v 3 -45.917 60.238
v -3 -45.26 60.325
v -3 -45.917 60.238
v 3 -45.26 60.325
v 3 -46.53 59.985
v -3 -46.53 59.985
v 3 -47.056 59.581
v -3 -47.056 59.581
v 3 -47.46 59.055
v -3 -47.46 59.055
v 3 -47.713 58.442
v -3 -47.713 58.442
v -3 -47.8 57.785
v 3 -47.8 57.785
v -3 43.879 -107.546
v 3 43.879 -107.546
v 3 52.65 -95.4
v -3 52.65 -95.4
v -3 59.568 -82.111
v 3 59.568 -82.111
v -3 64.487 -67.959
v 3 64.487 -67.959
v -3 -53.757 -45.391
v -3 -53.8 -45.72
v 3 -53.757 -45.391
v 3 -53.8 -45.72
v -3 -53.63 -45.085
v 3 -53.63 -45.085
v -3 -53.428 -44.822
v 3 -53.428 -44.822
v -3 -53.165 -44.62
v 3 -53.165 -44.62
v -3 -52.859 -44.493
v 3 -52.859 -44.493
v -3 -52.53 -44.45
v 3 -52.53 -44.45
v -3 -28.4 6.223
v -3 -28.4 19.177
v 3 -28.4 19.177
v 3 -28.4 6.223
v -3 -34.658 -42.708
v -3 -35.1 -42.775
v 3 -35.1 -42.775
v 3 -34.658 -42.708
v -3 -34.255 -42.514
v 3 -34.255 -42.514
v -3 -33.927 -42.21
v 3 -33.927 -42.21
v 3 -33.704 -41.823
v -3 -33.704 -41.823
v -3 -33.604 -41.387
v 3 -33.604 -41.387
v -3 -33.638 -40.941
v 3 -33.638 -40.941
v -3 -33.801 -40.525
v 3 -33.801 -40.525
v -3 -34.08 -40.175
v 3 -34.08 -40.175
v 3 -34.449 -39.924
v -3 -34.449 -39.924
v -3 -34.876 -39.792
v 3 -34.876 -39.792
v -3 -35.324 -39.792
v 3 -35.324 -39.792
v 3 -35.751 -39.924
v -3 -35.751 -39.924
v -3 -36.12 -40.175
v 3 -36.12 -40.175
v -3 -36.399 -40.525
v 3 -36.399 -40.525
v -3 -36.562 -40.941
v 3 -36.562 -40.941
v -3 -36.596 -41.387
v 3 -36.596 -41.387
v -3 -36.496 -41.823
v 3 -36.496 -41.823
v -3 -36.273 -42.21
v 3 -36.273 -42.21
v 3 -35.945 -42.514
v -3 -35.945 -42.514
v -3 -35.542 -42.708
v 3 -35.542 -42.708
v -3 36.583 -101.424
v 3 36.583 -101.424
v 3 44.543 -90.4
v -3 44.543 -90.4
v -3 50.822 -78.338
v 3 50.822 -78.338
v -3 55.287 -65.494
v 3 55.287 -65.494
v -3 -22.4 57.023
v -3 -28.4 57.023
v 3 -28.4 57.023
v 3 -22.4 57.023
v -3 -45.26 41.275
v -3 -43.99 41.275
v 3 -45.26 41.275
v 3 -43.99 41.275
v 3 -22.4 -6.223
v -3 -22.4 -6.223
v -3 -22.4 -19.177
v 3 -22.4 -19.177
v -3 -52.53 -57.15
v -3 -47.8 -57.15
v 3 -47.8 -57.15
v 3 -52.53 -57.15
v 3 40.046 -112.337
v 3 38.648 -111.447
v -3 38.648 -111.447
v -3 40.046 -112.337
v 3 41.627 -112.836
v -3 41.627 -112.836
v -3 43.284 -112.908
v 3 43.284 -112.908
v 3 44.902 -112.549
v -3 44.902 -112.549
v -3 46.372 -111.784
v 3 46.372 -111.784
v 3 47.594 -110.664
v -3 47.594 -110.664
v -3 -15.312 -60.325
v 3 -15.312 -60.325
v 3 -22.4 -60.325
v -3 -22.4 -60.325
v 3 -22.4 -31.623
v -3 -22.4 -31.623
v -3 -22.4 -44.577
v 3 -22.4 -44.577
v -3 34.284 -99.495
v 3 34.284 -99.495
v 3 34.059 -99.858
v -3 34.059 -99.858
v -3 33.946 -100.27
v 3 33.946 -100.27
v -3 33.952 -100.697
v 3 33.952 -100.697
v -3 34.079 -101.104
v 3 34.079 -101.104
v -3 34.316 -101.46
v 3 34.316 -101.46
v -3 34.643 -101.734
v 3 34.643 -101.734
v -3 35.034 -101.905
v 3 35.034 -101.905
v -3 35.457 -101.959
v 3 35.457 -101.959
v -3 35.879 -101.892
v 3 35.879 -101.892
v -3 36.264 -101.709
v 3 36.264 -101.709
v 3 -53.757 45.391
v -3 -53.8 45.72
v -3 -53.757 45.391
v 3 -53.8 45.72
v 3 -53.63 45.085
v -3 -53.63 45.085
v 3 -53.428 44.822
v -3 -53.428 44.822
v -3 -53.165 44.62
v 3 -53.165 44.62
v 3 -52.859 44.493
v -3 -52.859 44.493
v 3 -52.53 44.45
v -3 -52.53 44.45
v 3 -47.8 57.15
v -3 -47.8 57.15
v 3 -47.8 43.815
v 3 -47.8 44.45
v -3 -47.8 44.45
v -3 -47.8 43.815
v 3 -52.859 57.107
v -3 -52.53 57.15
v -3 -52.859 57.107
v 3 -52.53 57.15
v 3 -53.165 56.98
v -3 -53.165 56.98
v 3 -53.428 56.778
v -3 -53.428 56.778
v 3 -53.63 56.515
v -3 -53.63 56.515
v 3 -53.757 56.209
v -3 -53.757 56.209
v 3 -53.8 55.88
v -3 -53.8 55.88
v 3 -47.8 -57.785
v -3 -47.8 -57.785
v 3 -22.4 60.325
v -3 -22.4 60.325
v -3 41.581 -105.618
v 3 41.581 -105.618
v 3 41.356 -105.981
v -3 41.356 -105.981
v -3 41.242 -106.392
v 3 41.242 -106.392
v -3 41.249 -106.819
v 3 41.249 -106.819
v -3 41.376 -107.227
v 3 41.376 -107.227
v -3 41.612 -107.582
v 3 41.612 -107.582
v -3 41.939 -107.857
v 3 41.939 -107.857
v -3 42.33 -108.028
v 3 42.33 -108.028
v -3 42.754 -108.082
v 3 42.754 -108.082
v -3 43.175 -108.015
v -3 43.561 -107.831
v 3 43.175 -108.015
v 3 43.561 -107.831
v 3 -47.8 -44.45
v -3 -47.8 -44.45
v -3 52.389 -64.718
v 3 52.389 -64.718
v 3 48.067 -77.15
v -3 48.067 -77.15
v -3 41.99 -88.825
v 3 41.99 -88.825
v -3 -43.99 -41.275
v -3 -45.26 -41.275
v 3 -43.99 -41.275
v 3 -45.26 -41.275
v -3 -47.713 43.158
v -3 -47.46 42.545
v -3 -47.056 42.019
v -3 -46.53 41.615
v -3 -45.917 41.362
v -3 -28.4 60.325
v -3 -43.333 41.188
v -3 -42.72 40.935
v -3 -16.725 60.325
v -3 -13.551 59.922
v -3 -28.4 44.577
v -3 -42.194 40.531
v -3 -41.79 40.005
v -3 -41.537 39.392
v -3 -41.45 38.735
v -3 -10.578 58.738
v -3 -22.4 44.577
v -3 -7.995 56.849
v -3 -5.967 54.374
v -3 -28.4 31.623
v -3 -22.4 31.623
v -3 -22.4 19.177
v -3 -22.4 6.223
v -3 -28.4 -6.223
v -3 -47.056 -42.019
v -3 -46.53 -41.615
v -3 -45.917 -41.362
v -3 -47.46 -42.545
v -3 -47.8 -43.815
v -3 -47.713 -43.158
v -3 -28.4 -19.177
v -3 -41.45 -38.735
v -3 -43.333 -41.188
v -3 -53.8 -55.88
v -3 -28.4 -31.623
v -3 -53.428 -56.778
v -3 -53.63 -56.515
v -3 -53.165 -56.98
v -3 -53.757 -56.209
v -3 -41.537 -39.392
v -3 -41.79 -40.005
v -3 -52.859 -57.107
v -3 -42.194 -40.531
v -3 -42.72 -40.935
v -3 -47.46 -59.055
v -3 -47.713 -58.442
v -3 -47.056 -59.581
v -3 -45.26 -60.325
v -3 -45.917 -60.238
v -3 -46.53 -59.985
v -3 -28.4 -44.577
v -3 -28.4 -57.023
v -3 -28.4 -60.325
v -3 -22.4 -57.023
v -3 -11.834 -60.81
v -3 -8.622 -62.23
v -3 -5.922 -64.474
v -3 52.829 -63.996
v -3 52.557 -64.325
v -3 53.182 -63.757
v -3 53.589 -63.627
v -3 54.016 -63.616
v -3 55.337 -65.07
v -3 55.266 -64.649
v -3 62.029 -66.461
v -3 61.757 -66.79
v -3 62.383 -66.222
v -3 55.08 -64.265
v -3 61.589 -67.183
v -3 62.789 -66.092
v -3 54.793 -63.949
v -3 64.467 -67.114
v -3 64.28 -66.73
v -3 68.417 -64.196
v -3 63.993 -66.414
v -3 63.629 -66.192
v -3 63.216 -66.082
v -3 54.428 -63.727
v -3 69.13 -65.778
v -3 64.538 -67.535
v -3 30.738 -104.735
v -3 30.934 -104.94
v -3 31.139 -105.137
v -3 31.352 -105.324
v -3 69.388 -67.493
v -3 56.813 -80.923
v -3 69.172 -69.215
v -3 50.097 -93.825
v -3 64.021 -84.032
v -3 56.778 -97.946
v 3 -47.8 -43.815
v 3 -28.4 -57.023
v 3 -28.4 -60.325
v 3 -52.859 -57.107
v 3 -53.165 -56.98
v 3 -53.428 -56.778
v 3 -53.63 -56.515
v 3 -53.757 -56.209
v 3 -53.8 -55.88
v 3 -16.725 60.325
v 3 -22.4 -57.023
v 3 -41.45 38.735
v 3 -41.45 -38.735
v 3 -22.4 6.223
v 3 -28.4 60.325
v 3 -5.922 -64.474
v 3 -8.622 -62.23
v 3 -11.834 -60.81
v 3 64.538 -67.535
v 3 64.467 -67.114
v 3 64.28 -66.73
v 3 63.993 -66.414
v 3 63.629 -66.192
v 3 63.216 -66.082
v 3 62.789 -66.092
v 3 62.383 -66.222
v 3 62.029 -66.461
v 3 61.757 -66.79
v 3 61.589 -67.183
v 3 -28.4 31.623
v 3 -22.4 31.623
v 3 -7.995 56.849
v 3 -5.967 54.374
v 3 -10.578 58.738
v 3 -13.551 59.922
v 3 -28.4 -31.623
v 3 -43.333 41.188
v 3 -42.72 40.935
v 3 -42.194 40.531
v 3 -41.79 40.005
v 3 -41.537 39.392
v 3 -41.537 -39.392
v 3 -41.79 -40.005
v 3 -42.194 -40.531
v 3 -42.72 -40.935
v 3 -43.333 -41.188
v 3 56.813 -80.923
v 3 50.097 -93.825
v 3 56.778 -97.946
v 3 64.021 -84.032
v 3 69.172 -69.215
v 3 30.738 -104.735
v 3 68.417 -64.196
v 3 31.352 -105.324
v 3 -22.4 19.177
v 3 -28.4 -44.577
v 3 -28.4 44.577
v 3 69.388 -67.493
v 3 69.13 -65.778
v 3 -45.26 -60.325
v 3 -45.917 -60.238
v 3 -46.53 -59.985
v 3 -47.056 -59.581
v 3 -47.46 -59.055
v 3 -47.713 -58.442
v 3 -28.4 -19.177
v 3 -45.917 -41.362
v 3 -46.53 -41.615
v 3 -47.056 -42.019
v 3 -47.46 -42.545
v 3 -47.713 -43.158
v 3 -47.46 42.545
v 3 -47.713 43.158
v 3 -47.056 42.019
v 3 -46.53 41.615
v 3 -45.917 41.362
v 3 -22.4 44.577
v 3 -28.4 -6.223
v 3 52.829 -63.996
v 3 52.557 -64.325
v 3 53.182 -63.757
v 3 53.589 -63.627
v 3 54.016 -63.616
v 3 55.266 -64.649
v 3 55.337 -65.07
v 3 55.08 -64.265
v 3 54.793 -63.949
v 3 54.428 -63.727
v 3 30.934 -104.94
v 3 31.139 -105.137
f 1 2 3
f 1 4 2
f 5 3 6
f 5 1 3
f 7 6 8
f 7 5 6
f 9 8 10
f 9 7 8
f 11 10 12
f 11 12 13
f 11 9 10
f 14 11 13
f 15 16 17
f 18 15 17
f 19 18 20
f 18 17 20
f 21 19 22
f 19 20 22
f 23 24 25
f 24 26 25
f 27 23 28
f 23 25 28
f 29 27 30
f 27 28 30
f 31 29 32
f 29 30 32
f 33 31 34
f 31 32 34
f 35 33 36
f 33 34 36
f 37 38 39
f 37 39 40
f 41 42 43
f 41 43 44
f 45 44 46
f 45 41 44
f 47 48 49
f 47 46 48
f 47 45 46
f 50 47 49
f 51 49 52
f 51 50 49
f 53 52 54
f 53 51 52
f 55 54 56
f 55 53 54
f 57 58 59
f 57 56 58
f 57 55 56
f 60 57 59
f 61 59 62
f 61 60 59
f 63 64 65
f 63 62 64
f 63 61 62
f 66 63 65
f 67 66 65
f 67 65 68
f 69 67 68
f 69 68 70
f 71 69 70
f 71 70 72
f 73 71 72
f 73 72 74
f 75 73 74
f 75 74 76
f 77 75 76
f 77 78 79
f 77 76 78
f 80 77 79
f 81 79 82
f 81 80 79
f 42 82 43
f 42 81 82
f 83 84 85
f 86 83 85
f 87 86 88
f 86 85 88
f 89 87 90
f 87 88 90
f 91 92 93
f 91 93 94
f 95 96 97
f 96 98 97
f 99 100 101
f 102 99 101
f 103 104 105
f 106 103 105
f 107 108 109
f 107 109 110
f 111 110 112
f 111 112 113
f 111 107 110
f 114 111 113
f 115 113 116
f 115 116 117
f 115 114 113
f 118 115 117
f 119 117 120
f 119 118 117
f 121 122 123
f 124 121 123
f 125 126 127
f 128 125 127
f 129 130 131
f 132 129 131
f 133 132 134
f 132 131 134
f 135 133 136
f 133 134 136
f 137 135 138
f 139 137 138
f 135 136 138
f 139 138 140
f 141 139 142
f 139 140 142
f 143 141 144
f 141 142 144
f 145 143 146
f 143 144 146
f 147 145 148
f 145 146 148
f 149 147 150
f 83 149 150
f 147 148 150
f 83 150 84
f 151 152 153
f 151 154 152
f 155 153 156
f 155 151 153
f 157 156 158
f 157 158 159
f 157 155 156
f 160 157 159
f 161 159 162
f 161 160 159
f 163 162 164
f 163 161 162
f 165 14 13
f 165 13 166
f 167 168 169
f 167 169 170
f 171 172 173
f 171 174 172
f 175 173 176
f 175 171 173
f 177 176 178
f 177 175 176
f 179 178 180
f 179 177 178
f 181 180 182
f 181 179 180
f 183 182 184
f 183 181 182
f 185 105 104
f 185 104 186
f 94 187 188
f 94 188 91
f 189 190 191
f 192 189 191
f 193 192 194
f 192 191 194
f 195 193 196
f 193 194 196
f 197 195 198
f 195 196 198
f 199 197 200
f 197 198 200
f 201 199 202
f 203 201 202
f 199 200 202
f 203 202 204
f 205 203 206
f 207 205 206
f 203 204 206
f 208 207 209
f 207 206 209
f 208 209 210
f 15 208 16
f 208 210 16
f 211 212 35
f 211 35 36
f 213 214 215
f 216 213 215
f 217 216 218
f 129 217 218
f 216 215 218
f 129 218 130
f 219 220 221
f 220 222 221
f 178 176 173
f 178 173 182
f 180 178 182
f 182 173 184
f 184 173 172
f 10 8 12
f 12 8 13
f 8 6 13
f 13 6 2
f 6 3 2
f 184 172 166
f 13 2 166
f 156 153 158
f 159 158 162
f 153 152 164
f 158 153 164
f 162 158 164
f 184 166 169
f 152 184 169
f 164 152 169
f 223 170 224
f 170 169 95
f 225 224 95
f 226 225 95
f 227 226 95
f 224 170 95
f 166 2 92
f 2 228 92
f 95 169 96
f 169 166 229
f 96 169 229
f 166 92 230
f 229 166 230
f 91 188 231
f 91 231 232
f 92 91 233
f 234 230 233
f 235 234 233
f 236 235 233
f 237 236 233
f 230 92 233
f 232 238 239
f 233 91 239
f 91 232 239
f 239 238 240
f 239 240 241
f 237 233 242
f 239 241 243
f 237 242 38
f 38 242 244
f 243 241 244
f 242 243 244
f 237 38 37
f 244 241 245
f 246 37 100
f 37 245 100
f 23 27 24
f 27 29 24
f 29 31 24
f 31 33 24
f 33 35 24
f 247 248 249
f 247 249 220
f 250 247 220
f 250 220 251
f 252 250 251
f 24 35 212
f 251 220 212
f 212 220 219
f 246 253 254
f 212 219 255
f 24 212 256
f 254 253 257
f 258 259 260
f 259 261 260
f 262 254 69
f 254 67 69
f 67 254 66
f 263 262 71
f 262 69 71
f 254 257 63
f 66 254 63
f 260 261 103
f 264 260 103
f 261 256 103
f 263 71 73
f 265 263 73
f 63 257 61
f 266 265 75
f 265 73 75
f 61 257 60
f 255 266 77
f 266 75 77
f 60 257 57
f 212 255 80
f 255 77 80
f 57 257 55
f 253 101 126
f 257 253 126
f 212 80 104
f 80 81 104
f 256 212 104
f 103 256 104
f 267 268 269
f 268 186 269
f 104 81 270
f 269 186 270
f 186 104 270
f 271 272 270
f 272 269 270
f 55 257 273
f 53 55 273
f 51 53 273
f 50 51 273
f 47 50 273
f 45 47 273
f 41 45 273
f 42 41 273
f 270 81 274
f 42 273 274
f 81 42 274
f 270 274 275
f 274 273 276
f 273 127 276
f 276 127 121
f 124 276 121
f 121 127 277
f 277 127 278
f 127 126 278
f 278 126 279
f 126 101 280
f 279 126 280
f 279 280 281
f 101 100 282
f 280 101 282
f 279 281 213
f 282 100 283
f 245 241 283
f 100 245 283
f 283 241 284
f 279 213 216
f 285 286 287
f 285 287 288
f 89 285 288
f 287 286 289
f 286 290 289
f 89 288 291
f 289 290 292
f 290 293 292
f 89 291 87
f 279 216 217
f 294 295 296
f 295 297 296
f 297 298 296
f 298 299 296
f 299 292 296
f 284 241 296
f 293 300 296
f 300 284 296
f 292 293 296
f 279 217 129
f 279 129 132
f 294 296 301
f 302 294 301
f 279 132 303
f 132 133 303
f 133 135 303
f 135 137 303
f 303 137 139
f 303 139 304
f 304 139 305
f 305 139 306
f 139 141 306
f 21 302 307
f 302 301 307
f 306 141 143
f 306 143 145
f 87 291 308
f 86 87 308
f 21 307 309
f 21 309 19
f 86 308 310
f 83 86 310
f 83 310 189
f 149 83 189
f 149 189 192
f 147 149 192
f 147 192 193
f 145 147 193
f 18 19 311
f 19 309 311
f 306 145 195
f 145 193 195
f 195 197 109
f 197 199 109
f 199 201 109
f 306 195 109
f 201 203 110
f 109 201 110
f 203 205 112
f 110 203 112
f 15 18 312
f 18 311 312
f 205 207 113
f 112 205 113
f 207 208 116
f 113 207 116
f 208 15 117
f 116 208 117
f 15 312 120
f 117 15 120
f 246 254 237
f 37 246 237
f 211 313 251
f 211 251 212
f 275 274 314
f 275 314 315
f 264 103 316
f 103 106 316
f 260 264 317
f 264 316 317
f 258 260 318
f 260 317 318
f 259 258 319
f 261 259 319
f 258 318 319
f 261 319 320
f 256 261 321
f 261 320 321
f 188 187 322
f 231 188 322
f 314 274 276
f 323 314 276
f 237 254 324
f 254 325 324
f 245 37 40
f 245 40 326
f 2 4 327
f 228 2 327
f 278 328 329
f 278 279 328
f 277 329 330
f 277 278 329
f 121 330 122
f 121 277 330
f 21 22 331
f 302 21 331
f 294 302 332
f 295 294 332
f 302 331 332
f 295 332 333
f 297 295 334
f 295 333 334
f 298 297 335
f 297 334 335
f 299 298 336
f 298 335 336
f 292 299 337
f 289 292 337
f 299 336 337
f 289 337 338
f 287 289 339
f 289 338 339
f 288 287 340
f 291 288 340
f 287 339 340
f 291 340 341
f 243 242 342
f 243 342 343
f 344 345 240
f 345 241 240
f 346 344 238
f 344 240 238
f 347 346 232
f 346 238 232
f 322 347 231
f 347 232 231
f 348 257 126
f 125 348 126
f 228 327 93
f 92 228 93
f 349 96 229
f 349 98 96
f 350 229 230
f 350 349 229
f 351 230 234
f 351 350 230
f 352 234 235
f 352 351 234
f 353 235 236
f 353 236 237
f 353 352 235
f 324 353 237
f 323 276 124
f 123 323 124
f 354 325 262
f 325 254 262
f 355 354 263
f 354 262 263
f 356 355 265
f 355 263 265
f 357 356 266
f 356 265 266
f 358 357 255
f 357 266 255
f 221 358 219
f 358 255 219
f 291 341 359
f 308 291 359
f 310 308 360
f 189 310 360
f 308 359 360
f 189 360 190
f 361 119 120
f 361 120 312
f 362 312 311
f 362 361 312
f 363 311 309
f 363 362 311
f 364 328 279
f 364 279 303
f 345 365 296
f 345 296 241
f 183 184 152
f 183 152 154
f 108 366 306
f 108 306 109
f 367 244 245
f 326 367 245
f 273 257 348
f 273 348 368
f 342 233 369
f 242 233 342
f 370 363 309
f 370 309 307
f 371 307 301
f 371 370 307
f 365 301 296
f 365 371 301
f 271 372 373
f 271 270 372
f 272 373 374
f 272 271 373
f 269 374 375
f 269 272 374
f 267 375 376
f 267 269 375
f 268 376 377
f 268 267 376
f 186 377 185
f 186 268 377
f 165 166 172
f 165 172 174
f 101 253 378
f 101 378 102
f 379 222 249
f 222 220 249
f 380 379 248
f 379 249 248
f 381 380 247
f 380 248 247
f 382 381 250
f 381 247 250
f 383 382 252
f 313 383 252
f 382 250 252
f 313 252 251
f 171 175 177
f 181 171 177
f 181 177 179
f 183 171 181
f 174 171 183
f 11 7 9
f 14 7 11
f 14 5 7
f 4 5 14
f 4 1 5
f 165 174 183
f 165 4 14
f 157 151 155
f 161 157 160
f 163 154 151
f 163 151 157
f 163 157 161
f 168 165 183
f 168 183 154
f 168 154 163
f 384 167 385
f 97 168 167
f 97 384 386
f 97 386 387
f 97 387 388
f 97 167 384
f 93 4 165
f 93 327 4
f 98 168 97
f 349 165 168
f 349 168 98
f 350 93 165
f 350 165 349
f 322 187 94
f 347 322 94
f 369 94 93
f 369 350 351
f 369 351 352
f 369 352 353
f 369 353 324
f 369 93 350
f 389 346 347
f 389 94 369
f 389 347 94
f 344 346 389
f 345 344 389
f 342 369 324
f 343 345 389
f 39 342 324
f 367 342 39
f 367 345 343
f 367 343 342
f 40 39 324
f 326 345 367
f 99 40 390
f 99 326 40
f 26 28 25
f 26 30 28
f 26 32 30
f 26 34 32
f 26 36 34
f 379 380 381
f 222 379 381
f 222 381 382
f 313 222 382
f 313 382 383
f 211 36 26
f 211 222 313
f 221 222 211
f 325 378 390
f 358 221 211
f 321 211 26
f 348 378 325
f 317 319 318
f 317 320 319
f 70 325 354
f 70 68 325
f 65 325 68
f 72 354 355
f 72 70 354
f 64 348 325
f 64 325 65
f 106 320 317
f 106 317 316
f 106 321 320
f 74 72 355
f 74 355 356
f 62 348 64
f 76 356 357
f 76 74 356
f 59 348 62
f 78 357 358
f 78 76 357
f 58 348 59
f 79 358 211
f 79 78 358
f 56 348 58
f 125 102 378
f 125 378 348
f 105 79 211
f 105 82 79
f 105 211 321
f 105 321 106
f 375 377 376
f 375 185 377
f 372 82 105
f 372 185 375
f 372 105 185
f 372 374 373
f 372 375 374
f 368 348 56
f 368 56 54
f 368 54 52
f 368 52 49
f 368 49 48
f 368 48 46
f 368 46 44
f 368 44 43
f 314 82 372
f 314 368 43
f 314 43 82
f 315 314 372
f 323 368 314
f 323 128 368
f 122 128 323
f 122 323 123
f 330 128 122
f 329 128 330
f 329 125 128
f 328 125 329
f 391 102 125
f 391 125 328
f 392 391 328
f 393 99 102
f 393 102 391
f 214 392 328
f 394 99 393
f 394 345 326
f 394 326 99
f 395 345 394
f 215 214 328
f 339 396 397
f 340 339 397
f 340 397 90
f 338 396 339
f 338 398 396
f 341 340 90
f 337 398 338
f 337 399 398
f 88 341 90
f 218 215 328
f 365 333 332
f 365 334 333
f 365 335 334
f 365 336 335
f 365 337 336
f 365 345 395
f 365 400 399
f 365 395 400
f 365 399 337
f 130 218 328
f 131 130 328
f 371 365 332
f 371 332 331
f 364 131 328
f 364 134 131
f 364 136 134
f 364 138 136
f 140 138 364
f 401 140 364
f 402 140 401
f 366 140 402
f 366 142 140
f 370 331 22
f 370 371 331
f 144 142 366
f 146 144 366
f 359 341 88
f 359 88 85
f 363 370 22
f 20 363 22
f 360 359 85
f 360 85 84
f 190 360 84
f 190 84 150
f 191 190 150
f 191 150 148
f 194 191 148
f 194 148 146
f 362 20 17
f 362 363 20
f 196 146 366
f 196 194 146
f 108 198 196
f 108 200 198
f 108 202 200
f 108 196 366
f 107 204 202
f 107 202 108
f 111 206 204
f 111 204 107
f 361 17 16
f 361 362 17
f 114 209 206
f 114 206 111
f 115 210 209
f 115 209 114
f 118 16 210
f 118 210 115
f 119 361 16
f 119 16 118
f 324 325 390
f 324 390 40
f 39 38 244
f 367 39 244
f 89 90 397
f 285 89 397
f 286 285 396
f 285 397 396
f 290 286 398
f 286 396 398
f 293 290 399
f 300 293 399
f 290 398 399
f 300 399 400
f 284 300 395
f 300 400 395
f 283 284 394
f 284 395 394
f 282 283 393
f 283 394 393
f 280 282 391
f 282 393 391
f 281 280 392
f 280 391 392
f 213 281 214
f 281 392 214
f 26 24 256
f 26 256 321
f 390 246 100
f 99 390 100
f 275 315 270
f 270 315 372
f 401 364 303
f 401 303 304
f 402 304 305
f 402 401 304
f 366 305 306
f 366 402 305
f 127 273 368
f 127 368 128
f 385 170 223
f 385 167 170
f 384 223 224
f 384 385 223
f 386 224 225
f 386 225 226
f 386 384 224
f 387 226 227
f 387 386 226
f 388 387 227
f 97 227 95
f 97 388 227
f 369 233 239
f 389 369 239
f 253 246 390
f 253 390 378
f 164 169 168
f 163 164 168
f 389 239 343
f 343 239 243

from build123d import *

# Parameters (mm, degrees)
MOUNTING_DEPTH          = 3
SKETCH3_R               = 1.5
BOSS_EXTRUDE2_DEPTH     = 6
PIVOTHOLE_DEPTH         = 133.681535985
PIVOTHOLE_DEPTH_BACK    = 133.681535985
SKETCH3_2_R             = 1.5
SKETCH4_W               = 6
SKETCH4_H               = 12.7
TAB_DEPTH               = 6
FILLET1_R               = 12.7
FILLET2_R               = 2.54
TABFILLET_R             = 1.27
CUT_EXTRUDE2_DEPTH      = 133.681535985
CUT_EXTRUDE2_DEPTH_BACK = 133.681535985
SKETCH5_W               = 12.954
SKETCH5_H               = 6


with BuildPart() as part:
    # Sketch2 → Mounting (new, symmetric)
    with BuildSketch(Plane(origin=(0, 0, 0), x_dir=(0, 0, -1), z_dir=(1, 0, 0))):
        Polygon((-60.325, -47.8), (-60.325, -9.7), (60.325, -9.7), (60.325, -47.8), (57.15, -47.8), (44.45, -47.8), (41.275, -47.8), (41.275, -41.45), (-41.275, -41.45), (-41.275, -47.8), (-44.45, -47.8), (-57.15, -47.8), align=None)
    extrude(amount=MOUNTING_DEPTH, both=True)

    # Sketch3 → Boss-Extrude2 (add)
    # profile 1 of 2: a face of its own
    with BuildSketch(Plane(origin=(3, 0, 0), x_dir=(0, 0, -1), z_dir=(1, 0, 0))):
        with Locations((41.275, -35.1)):
            Circle(SKETCH3_R)
    # profile 2 of 2: a face of its own
    with BuildSketch(Plane(origin=(3, 0, 0), x_dir=(0, 0, -1), z_dir=(1, 0, 0))):
        with BuildLine():
            Line((64.196478559, 68.417190639), (-60.325, -9.7))
            Line((-60.325, -9.7), (60.325, -9.7))
            Line((60.325, -9.7), (104.734943372, 30.73838178))
            ThreePointArc((104.734943372, 30.73838178), (105.039779736, 31.035237071), (105.324051376, 31.351840779))
            Line((105.324051376, 31.351840779), (111.446603358, 38.648414099))
            ThreePointArc((111.446603358, 38.648414099), (112.908057477, 43.283554387), (110.663922466, 47.594497635))
            ThreePointArc((110.663922466, 47.594497635), (91.120762799, 60.652819442), (69.214515919, 69.171692948))
            ThreePointArc((69.214515919, 69.171692948), (66.626854298, 69.317479577), (64.196478559, 68.417190639))
        make_face()
        with BuildLine():
            ThreePointArc((107.546402559, 43.879182086), (88.881282025, 56.350816901), (67.95924355, 64.48695269))
            ThreePointArc((67.95924355, 64.48695269), (66.122126243, 63.426292519), (67.182786415, 61.589175212))
            ThreePointArc((67.182786415, 61.589175212), (87.496036185, 53.689784401), (105.61803973, 41.581048756))
            ThreePointArc((105.61803973, 41.581048756), (107.731287809, 41.765934006), (107.546402559, 43.879182086))
        make_face(mode=Mode.SUBTRACT)
        with BuildLine():
            ThreePointArc((101.423850576, 36.582608765), (84.483126483, 47.902038715), (65.493992145, 55.286509195))
            ThreePointArc((65.493992145, 55.286509195), (63.656874838, 54.225849023), (64.71753501, 52.388731716))
            ThreePointArc((64.71753501, 52.388731716), (83.097880644, 45.241006215), (99.495487747, 34.284475436))
            ThreePointArc((99.495487747, 34.284475436), (101.608735827, 34.469360686), (101.423850576, 36.582608765))
        make_face(mode=Mode.SUBTRACT)
    extrude(amount=-BOSS_EXTRUDE2_DEPTH)

    # Sketch3<2> → PivotHole (cut, two sides: drawn at the far end of the back side and taken through both)
    with BuildSketch(Plane(origin=(3, 0, 0), x_dir=(0, 0, -1), z_dir=(1, 0, 0)).offset(-PIVOTHOLE_DEPTH_BACK)):
        with Locations((41.275, -35.1)):
            Circle(SKETCH3_2_R)
    extrude(amount=PIVOTHOLE_DEPTH + PIVOTHOLE_DEPTH_BACK, mode=Mode.SUBTRACT)

    # Sketch4 → Tab (add)
    with BuildSketch(Plane.XZ.offset(47.8)):
        with Locations((0, 50.8)):
            Rectangle(SKETCH4_W, SKETCH4_H)
        with Locations((0, -50.8)):
            Rectangle(SKETCH4_W, SKETCH4_H)
    extrude(amount=TAB_DEPTH)

    # Fillet1
    fillet1_edges = [part.edges().sort_by_distance(p)[0] for p in [
        (0, -9.7, 60.325),
        (0, -9.7, -60.325),
    ]]
    fillet(fillet1_edges, radius=FILLET1_R)

    # Fillet2
    fillet2_edges = [part.edges().sort_by_distance(p)[0] for p in [
        (0, -47.8, 60.325),
        (0, -47.8, -60.325),
        (0, -47.8, -41.275),
        (0, -41.45, -41.275),
        (0, -41.45, 41.275),
        (0, -47.8, 41.275),
    ]]
    fillet(fillet2_edges, radius=FILLET2_R)

    # TabFillet
    tabfillet_edges = [part.edges().sort_by_distance(p)[0] for p in [
        (0, -53.8, 57.15),
        (0, -53.8, 44.45),
        (0, -53.8, -44.45),
        (0, -53.8, -57.15),
    ]]
    fillet(tabfillet_edges, radius=TABFILLET_R)

    # Sketch5 → Cut-Extrude2 (cut, two sides: drawn at the far end of the back side and taken through both)
    with BuildSketch(Plane(origin=(3, 0, 0), x_dir=(0, 0, -1), z_dir=(1, 0, 0)).offset(-CUT_EXTRUDE2_DEPTH_BACK)):
        with Locations((-88.9, -25.4)):
            Rectangle(SKETCH5_W, SKETCH5_H)
        with Locations((-63.5, -25.4)):
            Rectangle(SKETCH5_W, SKETCH5_H)
        with Locations((-38.1, -25.4)):
            Rectangle(SKETCH5_W, SKETCH5_H)
        with Locations((-12.7, -25.4)):
            Rectangle(SKETCH5_W, SKETCH5_H)
        with Locations((12.7, -25.4)):
            Rectangle(SKETCH5_W, SKETCH5_H)
        with Locations((38.1, -25.4)):
            Rectangle(SKETCH5_W, SKETCH5_H)
        with Locations((63.5, -25.4)):
            Rectangle(SKETCH5_W, SKETCH5_H)
        with Locations((88.9, -25.4)):
            Rectangle(SKETCH5_W, SKETCH5_H)
    extrude(amount=CUT_EXTRUDE2_DEPTH + CUT_EXTRUDE2_DEPTH_BACK, mode=Mode.SUBTRACT)


solid = part.part
